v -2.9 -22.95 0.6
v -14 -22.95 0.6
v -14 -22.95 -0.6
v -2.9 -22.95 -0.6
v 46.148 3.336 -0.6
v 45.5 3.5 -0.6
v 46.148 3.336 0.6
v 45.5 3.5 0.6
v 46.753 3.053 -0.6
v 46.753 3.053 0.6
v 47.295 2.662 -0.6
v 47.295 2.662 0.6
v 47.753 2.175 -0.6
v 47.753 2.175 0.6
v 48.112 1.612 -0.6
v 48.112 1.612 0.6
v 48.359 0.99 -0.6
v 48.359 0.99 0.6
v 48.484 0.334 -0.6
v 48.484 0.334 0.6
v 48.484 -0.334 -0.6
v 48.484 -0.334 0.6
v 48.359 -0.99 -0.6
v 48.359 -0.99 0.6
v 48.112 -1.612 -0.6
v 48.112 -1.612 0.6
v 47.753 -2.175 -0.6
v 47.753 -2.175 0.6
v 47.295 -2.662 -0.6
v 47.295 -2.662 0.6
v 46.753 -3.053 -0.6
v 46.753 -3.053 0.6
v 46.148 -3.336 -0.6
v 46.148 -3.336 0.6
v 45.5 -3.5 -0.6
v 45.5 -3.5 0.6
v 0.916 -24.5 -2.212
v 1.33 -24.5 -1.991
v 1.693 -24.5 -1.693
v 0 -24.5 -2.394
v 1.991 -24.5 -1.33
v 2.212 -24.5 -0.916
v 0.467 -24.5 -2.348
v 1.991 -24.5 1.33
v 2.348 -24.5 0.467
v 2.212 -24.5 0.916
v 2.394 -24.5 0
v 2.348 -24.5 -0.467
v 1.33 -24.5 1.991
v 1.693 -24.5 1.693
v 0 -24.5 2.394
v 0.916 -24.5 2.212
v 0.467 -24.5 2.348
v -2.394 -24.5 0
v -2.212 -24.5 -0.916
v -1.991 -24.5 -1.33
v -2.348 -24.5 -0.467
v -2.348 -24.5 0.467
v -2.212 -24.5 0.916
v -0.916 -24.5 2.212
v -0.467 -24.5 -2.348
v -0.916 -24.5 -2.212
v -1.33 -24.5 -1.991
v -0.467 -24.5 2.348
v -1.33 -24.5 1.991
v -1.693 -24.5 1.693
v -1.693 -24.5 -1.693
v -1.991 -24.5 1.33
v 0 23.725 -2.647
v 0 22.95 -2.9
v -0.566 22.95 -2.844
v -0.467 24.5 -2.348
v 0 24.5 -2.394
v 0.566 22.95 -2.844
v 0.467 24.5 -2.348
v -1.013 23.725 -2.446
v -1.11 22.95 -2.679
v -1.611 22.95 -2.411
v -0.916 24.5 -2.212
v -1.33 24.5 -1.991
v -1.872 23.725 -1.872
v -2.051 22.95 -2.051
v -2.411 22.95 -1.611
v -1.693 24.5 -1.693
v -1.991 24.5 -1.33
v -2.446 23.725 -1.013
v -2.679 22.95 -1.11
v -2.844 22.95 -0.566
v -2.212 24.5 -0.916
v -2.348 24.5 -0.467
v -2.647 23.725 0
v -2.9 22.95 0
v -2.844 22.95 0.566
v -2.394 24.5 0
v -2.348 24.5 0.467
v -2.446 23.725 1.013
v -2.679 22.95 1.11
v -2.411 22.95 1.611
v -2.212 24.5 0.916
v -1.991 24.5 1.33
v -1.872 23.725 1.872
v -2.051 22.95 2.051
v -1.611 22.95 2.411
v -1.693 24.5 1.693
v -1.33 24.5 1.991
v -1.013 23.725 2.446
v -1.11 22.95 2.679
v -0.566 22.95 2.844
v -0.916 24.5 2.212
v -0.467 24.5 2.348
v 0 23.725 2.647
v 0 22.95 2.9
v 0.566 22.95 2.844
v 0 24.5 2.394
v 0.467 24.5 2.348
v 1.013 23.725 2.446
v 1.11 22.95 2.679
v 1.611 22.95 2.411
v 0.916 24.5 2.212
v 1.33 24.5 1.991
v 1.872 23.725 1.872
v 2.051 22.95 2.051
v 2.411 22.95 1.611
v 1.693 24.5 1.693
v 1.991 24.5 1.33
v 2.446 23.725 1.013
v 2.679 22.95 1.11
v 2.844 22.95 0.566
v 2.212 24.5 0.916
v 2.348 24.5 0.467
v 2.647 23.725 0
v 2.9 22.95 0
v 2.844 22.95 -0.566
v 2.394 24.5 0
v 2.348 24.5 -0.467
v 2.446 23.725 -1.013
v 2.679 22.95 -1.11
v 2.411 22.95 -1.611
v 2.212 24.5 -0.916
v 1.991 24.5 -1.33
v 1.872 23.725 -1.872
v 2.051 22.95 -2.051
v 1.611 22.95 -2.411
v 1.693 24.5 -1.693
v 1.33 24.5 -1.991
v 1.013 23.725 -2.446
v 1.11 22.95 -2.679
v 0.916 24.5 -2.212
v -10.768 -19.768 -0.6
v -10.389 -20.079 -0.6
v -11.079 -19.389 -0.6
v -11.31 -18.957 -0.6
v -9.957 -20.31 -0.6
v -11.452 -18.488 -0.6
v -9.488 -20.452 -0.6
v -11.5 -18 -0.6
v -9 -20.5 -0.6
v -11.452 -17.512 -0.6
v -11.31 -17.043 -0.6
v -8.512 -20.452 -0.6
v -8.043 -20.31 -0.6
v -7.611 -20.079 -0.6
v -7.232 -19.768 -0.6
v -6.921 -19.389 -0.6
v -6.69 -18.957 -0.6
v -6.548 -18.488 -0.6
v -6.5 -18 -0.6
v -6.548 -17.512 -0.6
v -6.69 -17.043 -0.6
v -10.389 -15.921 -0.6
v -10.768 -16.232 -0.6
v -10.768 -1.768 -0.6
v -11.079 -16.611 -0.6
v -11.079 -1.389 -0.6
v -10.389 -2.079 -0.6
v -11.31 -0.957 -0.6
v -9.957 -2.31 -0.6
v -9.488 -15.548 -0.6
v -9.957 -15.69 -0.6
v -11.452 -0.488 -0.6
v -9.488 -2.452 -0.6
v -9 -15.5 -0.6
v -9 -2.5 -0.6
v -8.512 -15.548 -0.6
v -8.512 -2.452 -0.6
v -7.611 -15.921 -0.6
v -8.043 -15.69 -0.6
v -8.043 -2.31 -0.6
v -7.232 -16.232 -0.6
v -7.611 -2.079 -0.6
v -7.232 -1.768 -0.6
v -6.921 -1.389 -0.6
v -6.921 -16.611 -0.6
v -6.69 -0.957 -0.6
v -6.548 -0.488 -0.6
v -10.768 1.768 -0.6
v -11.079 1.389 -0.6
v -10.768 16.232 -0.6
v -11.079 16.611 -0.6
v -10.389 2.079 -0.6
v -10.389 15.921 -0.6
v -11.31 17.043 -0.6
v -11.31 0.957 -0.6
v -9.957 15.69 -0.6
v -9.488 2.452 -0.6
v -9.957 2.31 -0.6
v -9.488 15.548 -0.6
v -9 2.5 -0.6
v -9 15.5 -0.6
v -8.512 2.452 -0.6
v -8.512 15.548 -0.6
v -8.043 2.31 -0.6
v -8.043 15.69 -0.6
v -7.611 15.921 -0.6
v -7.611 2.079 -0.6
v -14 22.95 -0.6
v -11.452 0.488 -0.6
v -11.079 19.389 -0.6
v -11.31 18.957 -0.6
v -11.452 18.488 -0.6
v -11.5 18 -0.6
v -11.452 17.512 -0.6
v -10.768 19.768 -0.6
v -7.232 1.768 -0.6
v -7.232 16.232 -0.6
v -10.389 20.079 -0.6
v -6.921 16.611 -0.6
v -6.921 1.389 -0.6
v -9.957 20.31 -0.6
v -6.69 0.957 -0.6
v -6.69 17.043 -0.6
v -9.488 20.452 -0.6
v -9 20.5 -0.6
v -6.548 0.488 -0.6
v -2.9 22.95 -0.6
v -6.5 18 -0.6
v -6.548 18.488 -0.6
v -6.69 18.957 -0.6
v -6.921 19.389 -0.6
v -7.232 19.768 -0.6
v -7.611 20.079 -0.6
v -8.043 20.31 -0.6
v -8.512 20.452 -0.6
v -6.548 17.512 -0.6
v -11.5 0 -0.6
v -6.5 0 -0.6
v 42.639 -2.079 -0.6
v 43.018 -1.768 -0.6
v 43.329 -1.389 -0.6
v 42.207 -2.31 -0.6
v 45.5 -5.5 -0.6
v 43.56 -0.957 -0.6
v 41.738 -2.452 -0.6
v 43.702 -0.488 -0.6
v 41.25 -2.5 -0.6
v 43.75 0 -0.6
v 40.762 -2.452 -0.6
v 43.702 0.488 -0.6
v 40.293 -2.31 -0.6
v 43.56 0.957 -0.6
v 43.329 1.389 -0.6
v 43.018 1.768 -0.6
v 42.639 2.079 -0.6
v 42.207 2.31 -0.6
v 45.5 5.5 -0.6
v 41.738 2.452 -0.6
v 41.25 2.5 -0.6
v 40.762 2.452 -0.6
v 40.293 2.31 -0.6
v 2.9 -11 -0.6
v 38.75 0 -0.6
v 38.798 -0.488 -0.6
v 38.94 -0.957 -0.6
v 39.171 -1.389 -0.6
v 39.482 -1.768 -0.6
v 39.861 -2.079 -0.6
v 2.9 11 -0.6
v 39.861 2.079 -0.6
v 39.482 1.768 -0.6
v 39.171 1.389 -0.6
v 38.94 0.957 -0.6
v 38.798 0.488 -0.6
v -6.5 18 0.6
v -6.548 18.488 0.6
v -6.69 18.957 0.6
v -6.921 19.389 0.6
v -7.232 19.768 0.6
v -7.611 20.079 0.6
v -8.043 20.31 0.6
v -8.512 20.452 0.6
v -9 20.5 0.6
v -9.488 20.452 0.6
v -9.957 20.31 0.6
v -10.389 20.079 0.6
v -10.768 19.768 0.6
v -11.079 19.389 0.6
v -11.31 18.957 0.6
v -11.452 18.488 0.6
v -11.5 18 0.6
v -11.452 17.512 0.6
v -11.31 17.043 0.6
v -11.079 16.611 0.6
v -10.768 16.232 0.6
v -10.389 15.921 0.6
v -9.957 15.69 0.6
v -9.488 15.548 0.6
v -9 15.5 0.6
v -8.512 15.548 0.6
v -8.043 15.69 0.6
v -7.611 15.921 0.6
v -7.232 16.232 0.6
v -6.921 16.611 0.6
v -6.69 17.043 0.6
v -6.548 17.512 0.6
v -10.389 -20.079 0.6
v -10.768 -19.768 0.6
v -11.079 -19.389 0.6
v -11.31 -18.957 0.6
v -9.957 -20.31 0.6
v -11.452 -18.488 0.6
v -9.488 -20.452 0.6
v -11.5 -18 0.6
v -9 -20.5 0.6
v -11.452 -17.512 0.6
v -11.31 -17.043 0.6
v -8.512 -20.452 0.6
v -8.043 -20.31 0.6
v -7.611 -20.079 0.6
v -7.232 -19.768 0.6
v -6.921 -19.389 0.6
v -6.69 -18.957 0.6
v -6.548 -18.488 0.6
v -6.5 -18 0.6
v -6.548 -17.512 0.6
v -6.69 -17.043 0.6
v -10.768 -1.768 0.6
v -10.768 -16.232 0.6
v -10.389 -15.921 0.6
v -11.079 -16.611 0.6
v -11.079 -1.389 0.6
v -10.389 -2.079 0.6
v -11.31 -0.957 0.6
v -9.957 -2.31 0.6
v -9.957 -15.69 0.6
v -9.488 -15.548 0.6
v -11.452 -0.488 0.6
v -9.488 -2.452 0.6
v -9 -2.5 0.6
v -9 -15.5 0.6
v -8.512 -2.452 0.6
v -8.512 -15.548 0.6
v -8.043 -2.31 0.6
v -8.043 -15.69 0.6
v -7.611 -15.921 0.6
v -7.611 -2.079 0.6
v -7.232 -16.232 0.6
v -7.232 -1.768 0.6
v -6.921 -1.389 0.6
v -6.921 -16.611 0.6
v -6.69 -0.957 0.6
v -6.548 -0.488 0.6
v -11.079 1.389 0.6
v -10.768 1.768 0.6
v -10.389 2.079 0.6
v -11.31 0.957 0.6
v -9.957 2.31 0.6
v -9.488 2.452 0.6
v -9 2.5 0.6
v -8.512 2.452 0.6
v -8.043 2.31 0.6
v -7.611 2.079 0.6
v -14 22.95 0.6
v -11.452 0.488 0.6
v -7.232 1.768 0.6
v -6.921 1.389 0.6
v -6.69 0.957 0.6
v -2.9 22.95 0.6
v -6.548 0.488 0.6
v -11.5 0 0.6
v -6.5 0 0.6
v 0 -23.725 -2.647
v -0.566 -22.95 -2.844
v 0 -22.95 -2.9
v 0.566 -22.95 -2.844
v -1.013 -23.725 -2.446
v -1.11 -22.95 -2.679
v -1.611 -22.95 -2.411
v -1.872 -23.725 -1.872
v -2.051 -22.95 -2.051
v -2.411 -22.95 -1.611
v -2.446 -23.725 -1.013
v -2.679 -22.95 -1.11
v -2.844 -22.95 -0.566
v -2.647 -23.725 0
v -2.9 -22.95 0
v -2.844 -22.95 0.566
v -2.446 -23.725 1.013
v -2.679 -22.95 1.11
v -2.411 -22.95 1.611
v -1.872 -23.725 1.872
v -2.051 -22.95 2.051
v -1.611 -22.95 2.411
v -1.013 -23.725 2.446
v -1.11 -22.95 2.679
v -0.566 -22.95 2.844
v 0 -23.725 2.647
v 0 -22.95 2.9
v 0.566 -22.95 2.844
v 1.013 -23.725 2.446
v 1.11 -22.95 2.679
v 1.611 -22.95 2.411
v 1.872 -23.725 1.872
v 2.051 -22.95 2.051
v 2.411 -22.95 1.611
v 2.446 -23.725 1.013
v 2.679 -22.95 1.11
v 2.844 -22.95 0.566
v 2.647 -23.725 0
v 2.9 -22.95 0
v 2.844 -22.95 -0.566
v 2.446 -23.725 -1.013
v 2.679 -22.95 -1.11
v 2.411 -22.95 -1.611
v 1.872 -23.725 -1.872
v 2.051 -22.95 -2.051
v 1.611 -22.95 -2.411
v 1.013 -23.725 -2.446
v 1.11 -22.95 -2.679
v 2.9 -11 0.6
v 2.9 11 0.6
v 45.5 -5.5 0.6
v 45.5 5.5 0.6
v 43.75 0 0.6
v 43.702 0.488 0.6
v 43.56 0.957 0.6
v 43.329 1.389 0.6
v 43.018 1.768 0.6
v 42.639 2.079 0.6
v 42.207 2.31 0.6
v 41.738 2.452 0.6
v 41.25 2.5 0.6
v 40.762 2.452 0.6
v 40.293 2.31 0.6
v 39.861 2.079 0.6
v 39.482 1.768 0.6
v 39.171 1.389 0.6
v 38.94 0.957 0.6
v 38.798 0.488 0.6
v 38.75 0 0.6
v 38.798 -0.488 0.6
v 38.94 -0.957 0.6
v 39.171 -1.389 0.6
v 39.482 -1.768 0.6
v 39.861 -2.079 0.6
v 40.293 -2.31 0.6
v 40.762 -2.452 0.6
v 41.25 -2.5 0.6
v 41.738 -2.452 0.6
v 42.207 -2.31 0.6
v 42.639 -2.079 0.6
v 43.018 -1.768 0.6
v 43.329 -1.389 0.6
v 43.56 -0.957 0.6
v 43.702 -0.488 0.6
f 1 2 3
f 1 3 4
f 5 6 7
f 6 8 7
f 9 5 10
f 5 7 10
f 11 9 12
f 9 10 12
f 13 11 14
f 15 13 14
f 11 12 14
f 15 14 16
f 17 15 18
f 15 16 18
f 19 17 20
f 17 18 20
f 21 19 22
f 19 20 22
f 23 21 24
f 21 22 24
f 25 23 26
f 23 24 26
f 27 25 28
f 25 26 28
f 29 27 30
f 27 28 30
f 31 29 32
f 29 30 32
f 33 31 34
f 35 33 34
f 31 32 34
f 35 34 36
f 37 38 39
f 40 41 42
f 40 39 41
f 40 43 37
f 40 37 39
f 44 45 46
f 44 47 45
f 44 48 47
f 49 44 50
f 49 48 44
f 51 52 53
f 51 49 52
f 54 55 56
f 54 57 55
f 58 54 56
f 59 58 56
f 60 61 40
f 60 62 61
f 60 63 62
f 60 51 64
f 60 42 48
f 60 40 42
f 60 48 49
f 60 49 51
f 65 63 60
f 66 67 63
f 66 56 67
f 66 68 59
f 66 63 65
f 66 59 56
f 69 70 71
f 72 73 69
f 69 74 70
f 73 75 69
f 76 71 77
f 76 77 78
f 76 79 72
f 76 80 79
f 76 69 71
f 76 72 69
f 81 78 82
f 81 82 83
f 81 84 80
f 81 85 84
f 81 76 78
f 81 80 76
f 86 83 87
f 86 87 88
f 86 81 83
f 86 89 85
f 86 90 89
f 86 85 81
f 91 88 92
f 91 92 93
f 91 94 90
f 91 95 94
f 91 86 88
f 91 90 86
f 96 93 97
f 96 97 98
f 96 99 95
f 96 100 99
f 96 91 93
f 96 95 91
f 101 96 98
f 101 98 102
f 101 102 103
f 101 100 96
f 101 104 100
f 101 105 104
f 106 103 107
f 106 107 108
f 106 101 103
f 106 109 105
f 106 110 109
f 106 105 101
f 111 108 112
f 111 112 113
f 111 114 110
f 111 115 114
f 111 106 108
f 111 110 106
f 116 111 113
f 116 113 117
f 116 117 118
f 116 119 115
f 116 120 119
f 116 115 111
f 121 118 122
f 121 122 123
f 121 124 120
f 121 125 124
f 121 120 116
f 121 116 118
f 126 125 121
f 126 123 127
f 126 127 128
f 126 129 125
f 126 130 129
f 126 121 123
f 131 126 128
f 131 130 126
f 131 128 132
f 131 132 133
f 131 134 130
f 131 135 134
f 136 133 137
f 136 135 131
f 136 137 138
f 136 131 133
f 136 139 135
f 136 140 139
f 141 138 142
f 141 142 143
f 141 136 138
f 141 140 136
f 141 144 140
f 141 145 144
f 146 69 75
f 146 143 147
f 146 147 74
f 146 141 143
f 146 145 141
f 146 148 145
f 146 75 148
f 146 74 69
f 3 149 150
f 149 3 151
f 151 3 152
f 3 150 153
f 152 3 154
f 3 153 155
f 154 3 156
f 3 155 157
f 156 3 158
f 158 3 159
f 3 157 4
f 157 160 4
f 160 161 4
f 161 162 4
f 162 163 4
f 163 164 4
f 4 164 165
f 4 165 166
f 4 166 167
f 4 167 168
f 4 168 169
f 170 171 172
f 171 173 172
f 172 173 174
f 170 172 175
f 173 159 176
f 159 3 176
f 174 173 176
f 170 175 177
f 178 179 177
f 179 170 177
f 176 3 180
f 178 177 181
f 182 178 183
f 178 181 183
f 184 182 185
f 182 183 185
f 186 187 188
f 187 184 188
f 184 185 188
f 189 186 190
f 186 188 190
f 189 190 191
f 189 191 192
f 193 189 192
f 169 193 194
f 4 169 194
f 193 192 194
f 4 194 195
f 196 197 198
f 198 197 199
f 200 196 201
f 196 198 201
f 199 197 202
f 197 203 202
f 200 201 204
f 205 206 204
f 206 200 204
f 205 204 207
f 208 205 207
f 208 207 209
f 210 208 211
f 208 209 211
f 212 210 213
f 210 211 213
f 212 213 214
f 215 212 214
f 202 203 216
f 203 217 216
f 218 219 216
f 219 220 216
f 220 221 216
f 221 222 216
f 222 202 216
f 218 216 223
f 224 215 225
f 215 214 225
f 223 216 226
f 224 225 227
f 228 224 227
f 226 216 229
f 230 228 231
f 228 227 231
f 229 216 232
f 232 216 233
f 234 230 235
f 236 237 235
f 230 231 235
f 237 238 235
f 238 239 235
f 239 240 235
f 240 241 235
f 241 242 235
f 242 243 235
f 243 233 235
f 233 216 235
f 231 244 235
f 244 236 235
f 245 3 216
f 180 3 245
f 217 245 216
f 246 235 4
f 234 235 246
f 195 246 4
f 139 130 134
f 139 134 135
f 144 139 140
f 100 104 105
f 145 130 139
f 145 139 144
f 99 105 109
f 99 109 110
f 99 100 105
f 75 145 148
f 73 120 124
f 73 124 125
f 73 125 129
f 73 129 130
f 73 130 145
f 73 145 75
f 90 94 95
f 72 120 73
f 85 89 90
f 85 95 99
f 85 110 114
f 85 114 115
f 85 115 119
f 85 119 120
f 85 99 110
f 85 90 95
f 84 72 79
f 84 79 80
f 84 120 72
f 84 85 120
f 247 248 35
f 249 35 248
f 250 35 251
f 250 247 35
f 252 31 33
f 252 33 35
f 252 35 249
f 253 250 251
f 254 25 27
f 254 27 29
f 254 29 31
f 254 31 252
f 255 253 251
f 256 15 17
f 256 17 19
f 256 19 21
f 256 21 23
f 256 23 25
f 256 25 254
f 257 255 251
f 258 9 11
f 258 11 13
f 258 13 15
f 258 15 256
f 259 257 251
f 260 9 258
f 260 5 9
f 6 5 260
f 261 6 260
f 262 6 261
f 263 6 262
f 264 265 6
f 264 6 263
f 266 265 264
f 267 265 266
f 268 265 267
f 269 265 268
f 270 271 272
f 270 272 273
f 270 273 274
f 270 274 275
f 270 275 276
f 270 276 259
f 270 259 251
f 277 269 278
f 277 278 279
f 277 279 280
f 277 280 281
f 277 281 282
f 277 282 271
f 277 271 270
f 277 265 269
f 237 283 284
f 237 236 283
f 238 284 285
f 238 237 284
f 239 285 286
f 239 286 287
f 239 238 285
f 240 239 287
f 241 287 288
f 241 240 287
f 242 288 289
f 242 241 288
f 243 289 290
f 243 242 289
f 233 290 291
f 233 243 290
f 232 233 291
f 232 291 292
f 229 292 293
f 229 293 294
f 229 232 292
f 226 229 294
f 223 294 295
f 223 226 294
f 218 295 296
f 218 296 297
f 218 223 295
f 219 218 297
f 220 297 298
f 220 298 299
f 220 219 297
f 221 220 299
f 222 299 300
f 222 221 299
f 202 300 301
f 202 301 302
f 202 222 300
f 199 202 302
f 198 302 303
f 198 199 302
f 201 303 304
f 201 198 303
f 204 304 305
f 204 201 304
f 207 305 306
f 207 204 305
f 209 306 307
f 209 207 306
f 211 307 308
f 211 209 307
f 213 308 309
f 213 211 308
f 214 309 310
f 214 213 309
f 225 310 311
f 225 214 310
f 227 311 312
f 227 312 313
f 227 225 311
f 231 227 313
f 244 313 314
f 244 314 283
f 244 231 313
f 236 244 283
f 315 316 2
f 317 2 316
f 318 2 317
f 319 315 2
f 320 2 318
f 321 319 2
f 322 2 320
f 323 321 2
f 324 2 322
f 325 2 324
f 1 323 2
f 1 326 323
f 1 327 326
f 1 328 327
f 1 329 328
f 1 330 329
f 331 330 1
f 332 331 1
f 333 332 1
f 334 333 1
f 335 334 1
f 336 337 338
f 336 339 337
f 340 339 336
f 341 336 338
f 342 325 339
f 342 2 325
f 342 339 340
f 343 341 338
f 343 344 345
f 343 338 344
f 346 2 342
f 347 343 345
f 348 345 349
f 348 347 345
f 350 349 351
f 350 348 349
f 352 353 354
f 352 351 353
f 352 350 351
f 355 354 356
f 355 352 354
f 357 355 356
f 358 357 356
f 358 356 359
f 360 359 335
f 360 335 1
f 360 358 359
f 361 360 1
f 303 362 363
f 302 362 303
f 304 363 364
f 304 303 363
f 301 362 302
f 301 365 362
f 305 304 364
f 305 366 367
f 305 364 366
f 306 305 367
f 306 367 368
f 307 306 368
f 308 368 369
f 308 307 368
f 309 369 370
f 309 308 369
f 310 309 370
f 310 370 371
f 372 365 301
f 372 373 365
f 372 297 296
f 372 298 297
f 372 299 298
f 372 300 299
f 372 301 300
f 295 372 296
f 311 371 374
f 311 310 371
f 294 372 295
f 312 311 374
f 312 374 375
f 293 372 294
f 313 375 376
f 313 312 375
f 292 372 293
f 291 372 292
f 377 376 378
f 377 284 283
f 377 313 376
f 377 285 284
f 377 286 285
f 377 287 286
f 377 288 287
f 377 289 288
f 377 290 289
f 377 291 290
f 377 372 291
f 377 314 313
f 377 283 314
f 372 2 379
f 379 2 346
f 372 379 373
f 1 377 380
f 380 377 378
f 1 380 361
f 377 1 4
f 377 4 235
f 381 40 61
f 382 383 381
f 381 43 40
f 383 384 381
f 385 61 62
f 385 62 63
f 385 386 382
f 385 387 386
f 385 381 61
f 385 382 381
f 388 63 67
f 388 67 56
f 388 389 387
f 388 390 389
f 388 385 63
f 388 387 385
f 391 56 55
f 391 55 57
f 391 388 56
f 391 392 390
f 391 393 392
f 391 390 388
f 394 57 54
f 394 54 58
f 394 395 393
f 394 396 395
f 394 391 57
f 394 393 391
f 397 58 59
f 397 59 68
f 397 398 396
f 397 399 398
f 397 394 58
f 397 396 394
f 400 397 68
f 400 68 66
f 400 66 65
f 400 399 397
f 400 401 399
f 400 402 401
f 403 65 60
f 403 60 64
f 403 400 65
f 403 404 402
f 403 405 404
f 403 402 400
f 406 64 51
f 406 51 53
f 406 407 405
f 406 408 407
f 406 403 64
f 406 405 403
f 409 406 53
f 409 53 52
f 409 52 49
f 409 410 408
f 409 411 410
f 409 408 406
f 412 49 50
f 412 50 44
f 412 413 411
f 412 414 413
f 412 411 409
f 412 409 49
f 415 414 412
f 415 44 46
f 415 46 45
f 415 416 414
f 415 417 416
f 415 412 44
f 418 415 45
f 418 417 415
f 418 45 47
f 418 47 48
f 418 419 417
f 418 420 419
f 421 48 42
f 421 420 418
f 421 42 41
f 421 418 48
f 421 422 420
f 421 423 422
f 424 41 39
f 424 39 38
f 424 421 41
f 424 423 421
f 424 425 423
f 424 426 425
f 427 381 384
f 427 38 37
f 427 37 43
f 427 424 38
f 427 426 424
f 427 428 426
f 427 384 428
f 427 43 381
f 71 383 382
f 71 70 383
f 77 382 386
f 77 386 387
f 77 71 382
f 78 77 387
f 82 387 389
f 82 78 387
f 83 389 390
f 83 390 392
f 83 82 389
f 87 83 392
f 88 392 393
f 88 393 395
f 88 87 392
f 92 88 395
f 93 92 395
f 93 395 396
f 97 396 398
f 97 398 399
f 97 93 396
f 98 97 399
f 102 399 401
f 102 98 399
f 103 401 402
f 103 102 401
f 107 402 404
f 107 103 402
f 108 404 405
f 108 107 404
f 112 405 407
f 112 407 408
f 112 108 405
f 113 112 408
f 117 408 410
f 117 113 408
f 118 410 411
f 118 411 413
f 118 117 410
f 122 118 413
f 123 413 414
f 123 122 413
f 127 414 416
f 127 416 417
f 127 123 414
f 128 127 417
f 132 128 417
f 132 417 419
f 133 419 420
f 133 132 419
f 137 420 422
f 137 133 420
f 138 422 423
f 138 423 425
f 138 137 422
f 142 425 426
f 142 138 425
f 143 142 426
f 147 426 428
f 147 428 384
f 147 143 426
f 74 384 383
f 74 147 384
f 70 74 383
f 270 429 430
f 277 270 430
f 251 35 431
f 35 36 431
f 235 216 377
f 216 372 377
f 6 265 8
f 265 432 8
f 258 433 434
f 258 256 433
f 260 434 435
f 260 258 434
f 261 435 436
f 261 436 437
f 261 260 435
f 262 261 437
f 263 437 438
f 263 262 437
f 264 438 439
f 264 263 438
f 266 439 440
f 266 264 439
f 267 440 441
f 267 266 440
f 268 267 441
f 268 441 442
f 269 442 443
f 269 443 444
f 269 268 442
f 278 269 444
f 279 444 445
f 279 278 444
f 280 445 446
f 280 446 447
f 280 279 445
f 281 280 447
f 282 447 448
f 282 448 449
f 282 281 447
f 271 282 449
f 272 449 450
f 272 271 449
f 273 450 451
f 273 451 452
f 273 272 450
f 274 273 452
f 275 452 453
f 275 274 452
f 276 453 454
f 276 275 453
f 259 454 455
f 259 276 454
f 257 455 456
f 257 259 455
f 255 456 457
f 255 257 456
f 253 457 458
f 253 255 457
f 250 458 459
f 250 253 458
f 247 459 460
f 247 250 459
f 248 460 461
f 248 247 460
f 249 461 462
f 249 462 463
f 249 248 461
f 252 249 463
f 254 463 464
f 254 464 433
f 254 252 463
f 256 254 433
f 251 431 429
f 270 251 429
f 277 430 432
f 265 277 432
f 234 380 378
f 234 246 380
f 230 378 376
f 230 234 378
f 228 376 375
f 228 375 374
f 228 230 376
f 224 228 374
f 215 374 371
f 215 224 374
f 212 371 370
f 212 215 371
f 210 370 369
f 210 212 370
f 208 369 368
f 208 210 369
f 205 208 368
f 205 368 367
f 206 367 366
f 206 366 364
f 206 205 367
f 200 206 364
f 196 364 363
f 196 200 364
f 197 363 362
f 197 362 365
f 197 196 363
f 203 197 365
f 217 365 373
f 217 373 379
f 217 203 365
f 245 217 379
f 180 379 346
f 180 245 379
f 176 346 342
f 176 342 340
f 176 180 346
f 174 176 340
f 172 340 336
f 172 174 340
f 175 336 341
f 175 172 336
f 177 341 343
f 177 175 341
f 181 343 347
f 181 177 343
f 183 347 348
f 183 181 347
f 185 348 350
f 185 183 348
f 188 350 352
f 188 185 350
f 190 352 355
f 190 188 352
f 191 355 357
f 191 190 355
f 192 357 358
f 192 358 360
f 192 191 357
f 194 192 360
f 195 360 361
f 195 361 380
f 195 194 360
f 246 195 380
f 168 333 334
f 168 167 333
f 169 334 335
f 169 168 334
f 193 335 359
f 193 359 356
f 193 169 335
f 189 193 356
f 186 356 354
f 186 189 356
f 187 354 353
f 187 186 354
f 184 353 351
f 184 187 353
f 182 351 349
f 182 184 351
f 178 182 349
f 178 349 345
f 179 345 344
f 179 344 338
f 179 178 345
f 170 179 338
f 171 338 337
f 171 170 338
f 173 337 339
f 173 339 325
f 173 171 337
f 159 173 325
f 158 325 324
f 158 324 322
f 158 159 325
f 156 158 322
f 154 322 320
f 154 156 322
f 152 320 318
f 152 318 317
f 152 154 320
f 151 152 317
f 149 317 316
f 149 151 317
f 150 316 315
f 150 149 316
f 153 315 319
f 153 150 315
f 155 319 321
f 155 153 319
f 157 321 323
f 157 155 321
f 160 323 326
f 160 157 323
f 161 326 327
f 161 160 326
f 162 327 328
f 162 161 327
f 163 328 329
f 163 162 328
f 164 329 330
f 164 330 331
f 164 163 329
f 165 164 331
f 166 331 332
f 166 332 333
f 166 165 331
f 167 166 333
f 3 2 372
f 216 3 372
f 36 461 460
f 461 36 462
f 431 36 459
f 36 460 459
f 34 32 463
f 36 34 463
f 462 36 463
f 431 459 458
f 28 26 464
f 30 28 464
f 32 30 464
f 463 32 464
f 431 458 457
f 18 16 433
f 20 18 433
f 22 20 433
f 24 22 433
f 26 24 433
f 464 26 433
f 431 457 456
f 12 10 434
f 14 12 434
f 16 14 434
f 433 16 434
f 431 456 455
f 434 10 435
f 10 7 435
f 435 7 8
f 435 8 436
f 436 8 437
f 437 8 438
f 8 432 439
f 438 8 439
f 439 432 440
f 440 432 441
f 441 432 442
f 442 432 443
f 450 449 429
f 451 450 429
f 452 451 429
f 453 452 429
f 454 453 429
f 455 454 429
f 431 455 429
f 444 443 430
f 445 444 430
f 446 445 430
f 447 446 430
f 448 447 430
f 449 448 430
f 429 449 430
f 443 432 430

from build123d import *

# Parameters (mm, degrees)
SKETCH1_R             = 2.5
BOSS_EXTRUDE1_DEPTH   = 0.6
SKETCH1_W             = 11.1
SKETCH1_H             = 45.9
BOSS_EXTRUDE1_2_DEPTH = 0.6


with BuildPart() as part:
    # Sketch1 → Boss-Extrude1 (new, symmetric)
    with BuildSketch(Plane.XY):
        with BuildLine():
            Line((45.5, 5.5), (2.9, 11))
            Line((2.9, 11), (2.9, -11))
            Line((2.9, -11), (45.5, -5.5))
            Line((45.5, -5.5), (45.5, -3.5))
            ThreePointArc((45.5, -3.5), (48.5, 0), (45.5, 3.5))
            Line((45.5, 3.5), (45.5, 5.5))
        make_face()
        with Locations((41.25, 0)):
            Circle(SKETCH1_R, mode=Mode.SUBTRACT)
    extrude(amount=BOSS_EXTRUDE1_DEPTH, both=True)


with BuildPart() as body_2:
    # Sketch1 → Boss-Extrude1 2 (new, symmetric)
    with BuildSketch(Plane.XY):
        with Locations((-8.45, 0)):
            Rectangle(SKETCH1_W, SKETCH1_H)
        with Locations((-9, -18)):
            Circle(SKETCH1_R, mode=Mode.SUBTRACT)
        with Locations((-9, 0)):
            Circle(SKETCH1_R, mode=Mode.SUBTRACT)
        with Locations((-9, 18)):
            Circle(SKETCH1_R, mode=Mode.SUBTRACT)
    extrude(amount=BOSS_EXTRUDE1_2_DEPTH, both=True)


with BuildPart() as body_3:
    # Sketch1<5> → Revolve1 (revolve)
    with BuildSketch(Plane.XY):
        Polygon((2.9, 22.95), (2.393991589, 24.5), (0, 24.5), (0, -24.5), (2.393991589, -24.5), (2.9, -22.95), (2.9, -11), (2.9, 11), align=None)
    revolve(axis=Axis((0, 0, 0), (0, 1, 0)))


solid = Compound([part.part, body_2.part, body_3.part])
